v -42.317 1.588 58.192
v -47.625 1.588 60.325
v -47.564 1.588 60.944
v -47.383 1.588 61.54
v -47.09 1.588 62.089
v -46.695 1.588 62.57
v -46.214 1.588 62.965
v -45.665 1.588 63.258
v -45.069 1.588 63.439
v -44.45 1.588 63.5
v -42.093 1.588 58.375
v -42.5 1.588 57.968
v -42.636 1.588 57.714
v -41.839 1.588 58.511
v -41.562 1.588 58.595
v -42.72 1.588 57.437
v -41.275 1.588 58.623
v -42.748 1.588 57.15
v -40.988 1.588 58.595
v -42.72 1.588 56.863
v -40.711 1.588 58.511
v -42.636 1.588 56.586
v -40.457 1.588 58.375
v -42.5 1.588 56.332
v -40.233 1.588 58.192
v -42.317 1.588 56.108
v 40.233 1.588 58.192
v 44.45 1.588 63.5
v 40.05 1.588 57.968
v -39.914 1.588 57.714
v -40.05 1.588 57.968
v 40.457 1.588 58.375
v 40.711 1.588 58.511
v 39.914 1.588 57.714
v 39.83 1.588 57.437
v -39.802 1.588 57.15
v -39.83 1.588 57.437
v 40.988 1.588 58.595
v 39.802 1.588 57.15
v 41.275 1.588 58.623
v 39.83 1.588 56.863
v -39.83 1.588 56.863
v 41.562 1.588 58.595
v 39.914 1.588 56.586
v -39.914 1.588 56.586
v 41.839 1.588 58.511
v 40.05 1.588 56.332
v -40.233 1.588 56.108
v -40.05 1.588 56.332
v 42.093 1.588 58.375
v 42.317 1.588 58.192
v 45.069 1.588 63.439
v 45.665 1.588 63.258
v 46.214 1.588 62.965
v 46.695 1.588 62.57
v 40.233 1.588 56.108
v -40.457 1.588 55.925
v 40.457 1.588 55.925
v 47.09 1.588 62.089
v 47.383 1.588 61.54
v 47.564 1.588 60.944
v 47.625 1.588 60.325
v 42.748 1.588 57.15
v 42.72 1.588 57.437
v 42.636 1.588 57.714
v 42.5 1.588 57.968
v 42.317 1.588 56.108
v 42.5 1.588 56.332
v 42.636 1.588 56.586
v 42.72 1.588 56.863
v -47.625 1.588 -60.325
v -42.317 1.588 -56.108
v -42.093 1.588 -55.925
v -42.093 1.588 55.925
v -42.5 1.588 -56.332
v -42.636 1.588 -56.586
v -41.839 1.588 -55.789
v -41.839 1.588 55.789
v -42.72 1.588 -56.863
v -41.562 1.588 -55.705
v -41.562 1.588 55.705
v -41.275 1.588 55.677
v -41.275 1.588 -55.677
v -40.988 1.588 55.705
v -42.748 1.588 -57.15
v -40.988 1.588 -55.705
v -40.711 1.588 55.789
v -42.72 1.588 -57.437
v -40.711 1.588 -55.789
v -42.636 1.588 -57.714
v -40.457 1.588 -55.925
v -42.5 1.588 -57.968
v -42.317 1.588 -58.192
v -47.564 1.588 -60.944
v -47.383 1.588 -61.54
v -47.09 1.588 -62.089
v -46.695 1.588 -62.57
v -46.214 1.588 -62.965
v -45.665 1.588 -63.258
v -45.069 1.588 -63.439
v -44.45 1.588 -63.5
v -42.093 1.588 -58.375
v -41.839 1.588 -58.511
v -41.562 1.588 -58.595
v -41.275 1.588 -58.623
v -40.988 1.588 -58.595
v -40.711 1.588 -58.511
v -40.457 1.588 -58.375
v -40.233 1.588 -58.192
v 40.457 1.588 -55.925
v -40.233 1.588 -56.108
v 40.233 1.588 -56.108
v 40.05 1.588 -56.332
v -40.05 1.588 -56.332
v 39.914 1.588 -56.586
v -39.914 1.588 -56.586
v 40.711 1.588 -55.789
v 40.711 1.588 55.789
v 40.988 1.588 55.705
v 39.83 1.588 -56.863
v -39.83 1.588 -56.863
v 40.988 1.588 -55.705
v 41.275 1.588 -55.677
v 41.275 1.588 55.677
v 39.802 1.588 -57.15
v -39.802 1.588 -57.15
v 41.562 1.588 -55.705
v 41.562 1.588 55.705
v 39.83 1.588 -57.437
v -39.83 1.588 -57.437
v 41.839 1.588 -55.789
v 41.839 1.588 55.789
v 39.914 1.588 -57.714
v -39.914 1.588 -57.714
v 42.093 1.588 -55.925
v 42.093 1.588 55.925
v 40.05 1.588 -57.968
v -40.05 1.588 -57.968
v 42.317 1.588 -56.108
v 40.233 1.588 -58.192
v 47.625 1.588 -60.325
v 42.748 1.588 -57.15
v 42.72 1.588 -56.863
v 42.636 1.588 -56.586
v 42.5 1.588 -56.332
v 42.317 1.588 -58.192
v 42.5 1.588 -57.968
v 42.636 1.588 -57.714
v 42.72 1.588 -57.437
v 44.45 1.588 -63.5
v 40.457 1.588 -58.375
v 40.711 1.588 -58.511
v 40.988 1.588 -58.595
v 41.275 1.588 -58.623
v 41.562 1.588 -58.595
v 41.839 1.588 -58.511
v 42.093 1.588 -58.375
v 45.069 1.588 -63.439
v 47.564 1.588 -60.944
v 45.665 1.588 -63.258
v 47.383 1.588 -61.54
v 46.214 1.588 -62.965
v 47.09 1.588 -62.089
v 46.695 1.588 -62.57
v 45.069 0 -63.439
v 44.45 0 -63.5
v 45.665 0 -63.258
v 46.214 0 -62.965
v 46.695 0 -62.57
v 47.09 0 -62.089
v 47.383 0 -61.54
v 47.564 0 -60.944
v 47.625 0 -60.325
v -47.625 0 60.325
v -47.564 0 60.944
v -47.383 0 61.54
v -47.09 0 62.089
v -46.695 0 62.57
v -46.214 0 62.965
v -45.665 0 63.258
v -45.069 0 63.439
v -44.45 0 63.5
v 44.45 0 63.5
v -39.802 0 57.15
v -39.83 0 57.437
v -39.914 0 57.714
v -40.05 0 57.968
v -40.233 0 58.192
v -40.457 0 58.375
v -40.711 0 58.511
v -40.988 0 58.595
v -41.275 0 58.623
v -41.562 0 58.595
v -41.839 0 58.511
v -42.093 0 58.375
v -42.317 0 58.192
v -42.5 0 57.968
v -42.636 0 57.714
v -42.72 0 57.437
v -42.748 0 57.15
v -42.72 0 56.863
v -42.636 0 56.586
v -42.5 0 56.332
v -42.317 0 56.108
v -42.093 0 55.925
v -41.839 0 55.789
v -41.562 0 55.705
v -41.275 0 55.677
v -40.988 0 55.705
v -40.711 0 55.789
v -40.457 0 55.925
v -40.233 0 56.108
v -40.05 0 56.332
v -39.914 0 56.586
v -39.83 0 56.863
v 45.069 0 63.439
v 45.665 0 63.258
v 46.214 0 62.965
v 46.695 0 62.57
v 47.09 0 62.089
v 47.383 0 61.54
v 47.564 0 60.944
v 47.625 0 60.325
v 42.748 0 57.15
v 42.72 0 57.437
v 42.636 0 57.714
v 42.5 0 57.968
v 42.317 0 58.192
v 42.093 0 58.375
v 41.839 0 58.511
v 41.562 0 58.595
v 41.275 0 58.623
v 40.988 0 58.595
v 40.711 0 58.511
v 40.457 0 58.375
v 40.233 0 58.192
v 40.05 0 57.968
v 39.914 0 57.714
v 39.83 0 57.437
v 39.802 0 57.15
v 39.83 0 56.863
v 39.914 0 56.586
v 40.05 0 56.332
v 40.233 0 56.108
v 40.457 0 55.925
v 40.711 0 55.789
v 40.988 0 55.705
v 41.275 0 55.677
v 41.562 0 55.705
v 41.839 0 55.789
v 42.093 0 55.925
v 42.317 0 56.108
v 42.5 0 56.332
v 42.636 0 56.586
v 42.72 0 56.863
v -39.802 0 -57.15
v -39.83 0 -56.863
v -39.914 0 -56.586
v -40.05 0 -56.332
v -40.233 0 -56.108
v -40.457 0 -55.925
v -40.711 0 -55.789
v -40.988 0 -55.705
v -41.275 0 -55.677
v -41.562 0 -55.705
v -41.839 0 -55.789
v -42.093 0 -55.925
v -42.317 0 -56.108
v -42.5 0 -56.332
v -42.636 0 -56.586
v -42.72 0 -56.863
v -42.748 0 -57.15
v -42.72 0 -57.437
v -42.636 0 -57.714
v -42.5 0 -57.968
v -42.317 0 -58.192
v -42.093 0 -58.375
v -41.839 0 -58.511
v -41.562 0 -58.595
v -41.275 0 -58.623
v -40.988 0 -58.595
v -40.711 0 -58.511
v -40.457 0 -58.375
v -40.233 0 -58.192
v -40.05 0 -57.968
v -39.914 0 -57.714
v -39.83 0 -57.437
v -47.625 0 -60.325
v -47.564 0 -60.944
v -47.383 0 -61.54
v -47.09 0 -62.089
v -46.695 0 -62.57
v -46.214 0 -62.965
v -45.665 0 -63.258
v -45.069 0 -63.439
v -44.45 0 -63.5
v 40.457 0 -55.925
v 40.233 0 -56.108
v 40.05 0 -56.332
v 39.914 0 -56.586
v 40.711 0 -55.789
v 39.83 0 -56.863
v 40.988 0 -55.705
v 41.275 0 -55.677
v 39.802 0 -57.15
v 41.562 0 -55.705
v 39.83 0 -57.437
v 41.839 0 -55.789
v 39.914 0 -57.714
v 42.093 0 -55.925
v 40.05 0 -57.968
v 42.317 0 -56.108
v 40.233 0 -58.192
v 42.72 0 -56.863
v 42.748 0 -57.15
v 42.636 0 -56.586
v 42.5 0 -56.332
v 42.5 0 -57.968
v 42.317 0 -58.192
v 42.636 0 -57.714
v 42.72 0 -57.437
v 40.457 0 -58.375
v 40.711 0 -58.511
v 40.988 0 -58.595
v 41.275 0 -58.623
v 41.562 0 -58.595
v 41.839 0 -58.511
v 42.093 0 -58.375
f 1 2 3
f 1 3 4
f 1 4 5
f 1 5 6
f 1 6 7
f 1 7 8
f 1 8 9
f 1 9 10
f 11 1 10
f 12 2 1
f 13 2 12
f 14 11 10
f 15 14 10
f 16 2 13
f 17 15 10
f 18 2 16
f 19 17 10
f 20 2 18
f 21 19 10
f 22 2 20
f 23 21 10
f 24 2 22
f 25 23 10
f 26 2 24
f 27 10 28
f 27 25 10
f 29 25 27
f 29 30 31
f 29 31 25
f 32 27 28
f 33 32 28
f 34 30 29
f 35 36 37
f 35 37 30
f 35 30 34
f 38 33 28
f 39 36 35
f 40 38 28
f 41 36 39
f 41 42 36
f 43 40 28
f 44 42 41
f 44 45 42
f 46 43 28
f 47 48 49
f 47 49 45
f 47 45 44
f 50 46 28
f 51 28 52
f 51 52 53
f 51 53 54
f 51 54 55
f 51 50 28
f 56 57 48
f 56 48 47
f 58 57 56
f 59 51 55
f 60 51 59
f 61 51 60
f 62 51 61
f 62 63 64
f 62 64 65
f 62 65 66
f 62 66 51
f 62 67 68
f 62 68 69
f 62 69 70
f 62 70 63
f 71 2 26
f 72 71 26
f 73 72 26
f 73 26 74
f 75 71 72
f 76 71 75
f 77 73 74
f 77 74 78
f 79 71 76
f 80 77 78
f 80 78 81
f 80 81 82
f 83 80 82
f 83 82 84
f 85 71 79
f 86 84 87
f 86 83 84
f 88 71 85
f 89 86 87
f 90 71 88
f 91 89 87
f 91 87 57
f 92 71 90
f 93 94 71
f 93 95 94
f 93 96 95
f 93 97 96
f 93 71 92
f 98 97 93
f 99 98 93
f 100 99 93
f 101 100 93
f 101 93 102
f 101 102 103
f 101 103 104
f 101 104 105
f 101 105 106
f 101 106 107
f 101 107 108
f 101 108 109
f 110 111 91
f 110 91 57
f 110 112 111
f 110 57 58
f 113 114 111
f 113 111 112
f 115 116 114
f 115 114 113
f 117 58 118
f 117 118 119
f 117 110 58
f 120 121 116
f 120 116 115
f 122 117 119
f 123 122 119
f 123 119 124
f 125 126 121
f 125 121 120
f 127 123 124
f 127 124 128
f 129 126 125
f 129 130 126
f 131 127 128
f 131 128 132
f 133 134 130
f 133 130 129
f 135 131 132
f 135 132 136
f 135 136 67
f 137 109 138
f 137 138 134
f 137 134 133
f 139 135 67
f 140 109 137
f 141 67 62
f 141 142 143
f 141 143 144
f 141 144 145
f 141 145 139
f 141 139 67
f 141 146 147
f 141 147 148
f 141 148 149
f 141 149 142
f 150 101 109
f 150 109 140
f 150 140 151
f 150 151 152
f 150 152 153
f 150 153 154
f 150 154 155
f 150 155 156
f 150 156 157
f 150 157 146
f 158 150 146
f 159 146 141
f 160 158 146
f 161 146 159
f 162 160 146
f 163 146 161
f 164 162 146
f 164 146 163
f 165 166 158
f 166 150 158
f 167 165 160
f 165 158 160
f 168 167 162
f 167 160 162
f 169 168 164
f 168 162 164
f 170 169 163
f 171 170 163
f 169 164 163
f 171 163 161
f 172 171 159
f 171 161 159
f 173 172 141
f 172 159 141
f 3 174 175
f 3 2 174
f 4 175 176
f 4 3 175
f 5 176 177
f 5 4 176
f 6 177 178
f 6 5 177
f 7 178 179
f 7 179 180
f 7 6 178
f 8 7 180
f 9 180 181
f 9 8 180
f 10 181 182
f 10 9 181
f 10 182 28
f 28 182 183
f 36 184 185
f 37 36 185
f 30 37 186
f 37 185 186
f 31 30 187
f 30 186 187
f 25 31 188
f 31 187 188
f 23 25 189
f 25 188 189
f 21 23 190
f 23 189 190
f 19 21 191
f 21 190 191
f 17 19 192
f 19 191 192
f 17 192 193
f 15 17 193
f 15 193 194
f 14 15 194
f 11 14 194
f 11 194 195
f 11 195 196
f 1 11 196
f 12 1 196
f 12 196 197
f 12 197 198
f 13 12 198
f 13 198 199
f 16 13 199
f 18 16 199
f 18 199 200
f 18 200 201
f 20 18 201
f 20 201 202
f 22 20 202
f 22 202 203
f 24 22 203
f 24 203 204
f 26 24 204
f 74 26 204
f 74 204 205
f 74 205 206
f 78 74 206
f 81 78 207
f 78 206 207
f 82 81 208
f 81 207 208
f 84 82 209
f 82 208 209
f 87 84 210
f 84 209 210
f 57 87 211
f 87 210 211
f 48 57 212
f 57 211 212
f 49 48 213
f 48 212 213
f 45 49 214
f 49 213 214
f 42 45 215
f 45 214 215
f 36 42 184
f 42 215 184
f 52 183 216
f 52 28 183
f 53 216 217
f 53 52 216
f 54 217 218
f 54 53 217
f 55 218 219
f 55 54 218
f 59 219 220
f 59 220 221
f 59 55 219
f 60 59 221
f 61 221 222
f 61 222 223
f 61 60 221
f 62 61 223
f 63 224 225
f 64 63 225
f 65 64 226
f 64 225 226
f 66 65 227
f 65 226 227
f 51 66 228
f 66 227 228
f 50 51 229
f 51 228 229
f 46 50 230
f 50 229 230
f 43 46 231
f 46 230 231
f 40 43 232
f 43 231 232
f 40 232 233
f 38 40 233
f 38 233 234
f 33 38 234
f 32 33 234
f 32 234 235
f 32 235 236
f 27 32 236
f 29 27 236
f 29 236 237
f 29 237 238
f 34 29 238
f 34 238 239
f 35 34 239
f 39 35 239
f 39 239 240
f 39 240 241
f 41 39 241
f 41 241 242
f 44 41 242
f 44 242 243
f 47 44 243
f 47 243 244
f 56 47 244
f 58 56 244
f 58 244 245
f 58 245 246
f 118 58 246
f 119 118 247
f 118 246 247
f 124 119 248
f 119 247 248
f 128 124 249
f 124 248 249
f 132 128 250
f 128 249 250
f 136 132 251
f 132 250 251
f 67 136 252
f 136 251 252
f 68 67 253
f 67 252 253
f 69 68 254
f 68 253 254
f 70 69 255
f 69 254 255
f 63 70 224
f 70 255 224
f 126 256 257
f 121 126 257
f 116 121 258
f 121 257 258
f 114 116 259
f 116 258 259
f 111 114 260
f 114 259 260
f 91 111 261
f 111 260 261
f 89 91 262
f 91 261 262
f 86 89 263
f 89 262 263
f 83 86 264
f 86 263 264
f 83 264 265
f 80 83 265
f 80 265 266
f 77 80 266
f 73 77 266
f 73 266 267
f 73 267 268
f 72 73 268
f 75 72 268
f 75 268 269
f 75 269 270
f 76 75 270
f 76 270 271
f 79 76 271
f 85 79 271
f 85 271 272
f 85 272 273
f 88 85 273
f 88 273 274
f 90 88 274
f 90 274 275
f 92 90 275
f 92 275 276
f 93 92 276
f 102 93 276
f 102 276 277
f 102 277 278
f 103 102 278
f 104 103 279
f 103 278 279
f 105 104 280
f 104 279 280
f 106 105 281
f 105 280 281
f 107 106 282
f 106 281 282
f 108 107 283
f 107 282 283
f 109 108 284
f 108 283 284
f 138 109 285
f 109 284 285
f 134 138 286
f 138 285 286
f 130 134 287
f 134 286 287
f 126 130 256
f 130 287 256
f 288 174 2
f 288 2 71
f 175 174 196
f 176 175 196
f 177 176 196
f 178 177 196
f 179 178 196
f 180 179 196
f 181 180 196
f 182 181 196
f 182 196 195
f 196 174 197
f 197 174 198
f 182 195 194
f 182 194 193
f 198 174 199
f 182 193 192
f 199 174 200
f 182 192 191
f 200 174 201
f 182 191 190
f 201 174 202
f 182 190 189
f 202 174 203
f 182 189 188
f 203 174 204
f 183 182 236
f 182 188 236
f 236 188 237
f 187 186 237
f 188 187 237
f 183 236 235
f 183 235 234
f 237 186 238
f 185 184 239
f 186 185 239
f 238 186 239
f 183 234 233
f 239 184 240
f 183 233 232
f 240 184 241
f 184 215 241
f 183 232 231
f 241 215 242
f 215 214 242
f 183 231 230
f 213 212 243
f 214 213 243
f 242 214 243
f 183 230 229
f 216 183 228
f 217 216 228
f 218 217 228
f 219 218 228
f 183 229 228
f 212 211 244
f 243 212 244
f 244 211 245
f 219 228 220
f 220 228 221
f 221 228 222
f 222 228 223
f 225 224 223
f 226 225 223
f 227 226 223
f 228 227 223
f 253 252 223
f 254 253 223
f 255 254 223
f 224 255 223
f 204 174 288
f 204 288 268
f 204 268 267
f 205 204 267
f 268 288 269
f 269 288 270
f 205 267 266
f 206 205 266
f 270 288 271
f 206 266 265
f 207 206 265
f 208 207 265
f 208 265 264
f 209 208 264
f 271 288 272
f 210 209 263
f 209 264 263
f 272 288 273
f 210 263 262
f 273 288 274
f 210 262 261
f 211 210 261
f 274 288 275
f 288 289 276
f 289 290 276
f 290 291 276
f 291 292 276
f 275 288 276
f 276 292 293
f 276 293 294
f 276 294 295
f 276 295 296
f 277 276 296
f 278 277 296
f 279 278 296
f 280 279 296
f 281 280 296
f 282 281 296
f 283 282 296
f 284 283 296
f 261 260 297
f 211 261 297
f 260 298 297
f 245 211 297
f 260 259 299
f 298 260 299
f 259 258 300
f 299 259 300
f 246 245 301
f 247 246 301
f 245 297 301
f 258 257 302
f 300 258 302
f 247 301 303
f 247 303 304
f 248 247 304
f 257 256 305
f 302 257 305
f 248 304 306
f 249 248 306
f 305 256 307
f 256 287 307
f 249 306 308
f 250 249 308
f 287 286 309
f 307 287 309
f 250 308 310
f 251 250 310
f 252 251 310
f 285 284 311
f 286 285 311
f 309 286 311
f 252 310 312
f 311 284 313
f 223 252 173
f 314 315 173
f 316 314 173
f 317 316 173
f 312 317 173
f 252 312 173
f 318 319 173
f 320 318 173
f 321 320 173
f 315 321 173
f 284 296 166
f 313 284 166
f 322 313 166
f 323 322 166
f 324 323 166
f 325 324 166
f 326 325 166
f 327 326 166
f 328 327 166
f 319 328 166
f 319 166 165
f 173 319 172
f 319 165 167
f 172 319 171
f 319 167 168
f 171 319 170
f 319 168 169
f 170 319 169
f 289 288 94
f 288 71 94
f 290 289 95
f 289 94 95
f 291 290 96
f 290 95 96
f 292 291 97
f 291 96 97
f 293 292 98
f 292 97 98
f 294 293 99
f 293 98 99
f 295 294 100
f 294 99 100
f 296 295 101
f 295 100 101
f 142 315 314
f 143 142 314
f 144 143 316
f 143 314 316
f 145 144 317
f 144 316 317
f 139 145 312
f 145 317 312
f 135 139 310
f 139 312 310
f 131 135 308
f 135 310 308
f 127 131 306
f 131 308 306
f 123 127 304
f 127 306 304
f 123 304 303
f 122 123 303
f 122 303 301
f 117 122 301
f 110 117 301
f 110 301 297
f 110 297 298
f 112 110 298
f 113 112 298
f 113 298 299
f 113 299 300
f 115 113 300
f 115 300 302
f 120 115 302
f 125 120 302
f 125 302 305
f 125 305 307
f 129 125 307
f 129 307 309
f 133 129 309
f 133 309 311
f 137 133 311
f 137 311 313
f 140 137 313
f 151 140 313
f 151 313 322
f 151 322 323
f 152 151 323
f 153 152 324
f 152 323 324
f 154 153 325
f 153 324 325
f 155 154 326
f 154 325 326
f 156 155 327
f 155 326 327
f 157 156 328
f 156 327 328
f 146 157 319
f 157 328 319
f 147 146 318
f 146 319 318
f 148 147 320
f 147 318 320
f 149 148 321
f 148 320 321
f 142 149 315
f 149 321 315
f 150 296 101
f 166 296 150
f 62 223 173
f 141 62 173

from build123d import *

# Parameters (mm, degrees)
SKETCH1_W                 = 95.25
SKETCH1_H                 = 127
BOSS_EXTRUDE1_DEPTH       = 1.5875
F_4_CLEARANCE_HOLE1_D     = 2.9464
F_4_CLEARANCE_HOLE1_DEPTH = 9.652
F_4_CLEARANCE_HOLE1_TIP   = 0.885187864
FILLET1_R                 = 3.175


with BuildPart() as part:
    # Sketch1 → Boss-Extrude1 (new body)
    with BuildSketch(Plane(origin=(0, 0, 0), x_dir=(1, 0, 0), z_dir=(0, 1, 0))):
        Rectangle(SKETCH1_W, SKETCH1_H)
    extrude(amount=BOSS_EXTRUDE1_DEPTH)

    # #4 Clearance Hole1
    with Locations(Plane(origin=(0, 1.5875, 0), x_dir=(-1, 0, 0), z_dir=(0, 1, 0))):
        with Locations((41.275, -57.15), (-41.275, -57.15), (-41.275, 57.15), (41.275, 57.15)):
            Hole(F_4_CLEARANCE_HOLE1_D / 2, depth=F_4_CLEARANCE_HOLE1_DEPTH)
            with Locations((0, 0, -(F_4_CLEARANCE_HOLE1_DEPTH + F_4_CLEARANCE_HOLE1_TIP / 2))):  # 118° drill point
                Cone(0, F_4_CLEARANCE_HOLE1_D / 2, F_4_CLEARANCE_HOLE1_TIP, mode=Mode.SUBTRACT)

    # Fillet1
    fillet1_edges = [part.edges().sort_by_distance(p)[0] for p in [
        (47.625, 0.79375, 63.5),
        (-47.625, 0.79375, 63.5),
        (-47.625, 0.79375, -63.5),
        (47.625, 0.79375, -63.5),
    ]]
    fillet(fillet1_edges, radius=FILLET1_R)


solid = part.part
